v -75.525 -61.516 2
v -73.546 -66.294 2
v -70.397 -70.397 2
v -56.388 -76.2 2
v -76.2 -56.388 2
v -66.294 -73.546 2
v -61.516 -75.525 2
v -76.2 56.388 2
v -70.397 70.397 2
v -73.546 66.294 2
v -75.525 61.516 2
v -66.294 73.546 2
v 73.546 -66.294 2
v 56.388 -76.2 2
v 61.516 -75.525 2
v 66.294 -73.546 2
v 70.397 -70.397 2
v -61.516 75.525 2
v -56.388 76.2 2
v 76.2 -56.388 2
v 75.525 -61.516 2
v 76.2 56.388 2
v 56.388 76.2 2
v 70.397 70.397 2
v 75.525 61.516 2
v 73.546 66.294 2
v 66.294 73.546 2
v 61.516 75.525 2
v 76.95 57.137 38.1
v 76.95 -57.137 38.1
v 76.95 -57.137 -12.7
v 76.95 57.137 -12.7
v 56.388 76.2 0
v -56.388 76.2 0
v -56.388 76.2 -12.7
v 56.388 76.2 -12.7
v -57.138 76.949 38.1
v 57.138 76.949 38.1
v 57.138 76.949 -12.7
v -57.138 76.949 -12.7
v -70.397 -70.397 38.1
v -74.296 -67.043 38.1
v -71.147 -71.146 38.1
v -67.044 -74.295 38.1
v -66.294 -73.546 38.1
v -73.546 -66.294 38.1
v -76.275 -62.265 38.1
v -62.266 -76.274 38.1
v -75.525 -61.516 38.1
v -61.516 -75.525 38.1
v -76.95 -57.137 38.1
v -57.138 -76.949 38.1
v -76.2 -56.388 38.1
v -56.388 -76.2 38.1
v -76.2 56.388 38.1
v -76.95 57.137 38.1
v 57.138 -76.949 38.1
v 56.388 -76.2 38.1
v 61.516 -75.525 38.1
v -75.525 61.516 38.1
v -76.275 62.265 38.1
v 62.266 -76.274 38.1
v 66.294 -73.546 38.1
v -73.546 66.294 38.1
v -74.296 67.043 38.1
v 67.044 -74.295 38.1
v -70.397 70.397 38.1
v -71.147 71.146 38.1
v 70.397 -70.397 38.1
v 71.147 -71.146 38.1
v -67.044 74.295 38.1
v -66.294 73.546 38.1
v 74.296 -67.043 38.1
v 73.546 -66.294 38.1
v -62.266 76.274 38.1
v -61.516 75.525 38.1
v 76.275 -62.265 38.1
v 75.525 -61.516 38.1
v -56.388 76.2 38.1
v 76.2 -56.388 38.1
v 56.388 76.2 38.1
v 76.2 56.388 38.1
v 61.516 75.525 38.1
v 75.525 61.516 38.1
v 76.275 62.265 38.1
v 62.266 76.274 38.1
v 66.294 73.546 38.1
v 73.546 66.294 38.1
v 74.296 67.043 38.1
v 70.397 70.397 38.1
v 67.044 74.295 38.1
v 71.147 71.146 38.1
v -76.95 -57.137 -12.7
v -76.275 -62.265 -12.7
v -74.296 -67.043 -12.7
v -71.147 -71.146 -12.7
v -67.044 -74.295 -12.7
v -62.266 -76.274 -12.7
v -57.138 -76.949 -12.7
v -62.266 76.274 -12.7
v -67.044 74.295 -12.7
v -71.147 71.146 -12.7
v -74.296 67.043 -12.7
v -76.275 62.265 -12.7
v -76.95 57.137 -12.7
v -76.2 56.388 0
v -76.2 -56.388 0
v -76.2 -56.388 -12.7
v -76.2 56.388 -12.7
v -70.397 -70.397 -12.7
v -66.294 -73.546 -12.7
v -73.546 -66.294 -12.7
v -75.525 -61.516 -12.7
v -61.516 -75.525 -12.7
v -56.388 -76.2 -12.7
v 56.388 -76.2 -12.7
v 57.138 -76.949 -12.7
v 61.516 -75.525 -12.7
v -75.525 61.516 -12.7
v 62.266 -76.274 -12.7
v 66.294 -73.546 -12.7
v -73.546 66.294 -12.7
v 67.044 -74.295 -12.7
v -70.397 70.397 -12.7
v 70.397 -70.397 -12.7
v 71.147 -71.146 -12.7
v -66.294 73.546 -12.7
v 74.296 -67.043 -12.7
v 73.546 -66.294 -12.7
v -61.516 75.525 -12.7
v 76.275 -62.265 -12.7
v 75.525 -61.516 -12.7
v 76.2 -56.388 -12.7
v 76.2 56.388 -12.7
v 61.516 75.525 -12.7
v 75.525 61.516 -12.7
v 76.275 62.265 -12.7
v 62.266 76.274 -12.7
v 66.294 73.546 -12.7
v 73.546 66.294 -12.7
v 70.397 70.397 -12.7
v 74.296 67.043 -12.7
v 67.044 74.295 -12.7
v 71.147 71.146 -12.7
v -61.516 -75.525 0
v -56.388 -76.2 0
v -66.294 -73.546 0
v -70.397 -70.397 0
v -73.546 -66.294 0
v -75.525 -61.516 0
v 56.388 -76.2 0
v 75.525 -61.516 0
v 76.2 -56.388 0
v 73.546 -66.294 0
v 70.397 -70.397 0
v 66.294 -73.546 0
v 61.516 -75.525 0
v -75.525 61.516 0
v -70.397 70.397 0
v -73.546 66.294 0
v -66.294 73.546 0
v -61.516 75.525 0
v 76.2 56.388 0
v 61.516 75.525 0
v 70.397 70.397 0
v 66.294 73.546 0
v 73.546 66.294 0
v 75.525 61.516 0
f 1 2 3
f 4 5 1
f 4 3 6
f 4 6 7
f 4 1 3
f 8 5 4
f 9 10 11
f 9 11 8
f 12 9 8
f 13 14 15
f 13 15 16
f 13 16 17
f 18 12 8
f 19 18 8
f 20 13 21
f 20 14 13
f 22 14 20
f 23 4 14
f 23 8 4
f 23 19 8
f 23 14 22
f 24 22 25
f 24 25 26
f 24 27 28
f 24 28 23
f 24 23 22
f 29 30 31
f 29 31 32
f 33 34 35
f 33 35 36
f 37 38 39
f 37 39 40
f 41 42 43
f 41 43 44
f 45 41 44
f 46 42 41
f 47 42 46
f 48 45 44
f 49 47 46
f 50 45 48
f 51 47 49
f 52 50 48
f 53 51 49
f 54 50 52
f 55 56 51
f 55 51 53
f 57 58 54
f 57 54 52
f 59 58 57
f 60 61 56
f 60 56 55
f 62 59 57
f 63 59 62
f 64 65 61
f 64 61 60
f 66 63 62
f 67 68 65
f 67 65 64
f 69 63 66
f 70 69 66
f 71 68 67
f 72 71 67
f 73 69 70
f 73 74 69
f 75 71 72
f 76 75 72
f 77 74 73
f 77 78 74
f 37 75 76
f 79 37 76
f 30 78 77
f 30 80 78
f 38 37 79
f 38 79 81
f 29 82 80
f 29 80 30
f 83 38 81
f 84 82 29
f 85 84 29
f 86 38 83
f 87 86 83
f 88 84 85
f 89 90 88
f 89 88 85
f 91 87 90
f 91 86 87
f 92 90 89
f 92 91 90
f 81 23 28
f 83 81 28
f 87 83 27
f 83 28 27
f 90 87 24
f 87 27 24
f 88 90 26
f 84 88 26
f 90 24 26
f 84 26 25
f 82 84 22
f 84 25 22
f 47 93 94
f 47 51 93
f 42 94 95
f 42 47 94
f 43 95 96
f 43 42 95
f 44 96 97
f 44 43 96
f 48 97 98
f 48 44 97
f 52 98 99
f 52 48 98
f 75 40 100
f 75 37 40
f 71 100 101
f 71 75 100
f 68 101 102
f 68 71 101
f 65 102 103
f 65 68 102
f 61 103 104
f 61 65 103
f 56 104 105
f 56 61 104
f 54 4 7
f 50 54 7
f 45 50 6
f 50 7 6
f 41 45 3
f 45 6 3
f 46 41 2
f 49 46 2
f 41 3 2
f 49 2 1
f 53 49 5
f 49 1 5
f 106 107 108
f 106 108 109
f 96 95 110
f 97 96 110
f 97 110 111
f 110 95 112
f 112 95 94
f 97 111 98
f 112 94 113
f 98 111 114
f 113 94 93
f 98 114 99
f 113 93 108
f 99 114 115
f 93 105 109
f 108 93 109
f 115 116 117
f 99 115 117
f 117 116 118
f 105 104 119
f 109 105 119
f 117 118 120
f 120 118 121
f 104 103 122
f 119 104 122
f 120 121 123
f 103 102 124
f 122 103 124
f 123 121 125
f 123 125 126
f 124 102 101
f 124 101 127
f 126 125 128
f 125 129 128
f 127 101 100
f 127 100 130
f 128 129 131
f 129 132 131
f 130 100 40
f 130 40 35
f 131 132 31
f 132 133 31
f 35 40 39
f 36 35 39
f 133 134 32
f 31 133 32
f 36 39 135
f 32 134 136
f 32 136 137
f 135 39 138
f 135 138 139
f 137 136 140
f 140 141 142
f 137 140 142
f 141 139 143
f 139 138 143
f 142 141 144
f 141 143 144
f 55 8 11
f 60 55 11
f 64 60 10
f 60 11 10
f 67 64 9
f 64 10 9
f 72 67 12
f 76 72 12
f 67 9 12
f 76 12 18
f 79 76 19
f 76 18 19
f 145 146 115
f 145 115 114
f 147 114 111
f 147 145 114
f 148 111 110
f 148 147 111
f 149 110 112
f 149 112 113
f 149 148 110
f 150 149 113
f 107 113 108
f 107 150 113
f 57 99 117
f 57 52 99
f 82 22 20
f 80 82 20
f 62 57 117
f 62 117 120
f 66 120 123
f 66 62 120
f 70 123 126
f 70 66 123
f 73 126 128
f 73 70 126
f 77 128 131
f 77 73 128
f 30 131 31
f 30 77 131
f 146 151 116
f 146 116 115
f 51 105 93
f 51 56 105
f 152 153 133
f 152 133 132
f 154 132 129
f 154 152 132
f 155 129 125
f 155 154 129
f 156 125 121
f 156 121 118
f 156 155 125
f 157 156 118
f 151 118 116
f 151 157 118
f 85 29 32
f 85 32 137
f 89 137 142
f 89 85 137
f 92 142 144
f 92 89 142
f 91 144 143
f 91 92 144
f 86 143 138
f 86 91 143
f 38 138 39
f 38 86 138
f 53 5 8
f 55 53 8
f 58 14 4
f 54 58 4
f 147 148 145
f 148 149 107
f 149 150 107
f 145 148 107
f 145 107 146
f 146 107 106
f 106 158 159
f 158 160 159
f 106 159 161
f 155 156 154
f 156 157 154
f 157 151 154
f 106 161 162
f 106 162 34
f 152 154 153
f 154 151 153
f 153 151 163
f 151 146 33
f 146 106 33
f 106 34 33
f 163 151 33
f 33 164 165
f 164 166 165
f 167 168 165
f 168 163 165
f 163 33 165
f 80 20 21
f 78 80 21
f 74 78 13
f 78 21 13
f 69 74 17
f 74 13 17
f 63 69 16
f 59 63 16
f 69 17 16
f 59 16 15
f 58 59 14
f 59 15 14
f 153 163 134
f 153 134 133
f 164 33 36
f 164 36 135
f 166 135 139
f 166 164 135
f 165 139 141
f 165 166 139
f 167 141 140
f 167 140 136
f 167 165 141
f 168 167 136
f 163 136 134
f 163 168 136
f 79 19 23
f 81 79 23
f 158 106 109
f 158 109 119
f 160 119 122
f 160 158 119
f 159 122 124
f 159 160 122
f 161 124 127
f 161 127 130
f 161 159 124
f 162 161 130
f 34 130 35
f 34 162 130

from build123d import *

# Parameters (mm, degrees)
F1_DEPTH = 38.1
F2_DEPTH = 2
F3_DEPTH = 12.7


with BuildPart() as f1:
    # F0 (on Top) → F1 (new body)
    with BuildSketch(Plane.XY):
        with BuildLine():
            Line((-57.138, -76.9493), (-18.130362, -76.9493))
            Line((-18.130362, -76.9493), (57.138, -76.9493))
            ThreePointArc((57.138, -76.9493), (71.1472, -71.1465), (76.95, -57.1373))
            Line((76.95, -57.1373), (76.95, 57.1373))
            ThreePointArc((76.95, 57.1373), (71.1472, 71.1465), (57.138, 76.9493))
            Line((57.138, 76.9493), (-57.138, 76.9493))
            ThreePointArc((-57.138, 76.9493), (-71.1472, 71.1465), (-76.95, 57.1373))
            Line((-76.95, 57.1373), (-76.95, -57.1373))
            ThreePointArc((-76.95, -57.1373), (-71.1472, -71.1465), (-57.138, -76.9493))
        make_face()
        with BuildLine():
            Line((-56.388, 76.2), (56.388, 76.2))
            ThreePointArc((56.388, 76.2), (70.3972, 70.3972), (76.2, 56.388))
            Line((76.2, 56.388), (76.2, -56.388))
            ThreePointArc((76.2, -56.388), (70.3972, -70.3972), (56.388, -76.2))
            Line((56.388, -76.2), (-18.130362, -76.2))
            Line((-18.130362, -76.2), (-56.388, -76.2))
            ThreePointArc((-56.388, -76.2), (-70.3972, -70.3972), (-76.2, -56.388))
            Line((-76.2, -56.388), (-76.2, 56.388))
            ThreePointArc((-76.2, 56.388), (-70.3972, 70.3972), (-56.388, 76.2))
        make_face(mode=Mode.SUBTRACT)
    extrude(amount=F1_DEPTH)

    # F0 (on Top) → F2 (join)
    with BuildSketch(Plane.XY):
        with BuildLine():
            ThreePointArc((76.2, 56.388), (70.3972, 70.3972), (56.388, 76.2))
            Line((56.388, 76.2), (-56.388, 76.2))
            ThreePointArc((-56.388, 76.2), (-70.3972, 70.3972), (-76.2, 56.388))
            Line((-76.2, 56.388), (-76.2, -56.388))
            ThreePointArc((-76.2, -56.388), (-70.3972, -70.3972), (-56.388, -76.2))
            Line((-56.388, -76.2), (-18.130362, -76.2))
            Line((-18.130362, -76.2), (56.388, -76.2))
            ThreePointArc((56.388, -76.2), (70.3972, -70.3972), (76.2, -56.388))
            Line((76.2, -56.388), (76.2, 56.388))
        make_face()
    extrude(amount=F2_DEPTH)

    # F0 (on Top) → F3 (join)
    with BuildSketch(Plane.XY):
        with BuildLine():
            Line((-57.138, -76.9493), (-18.130362, -76.9493))
            Line((-18.130362, -76.9493), (57.138, -76.9493))
            ThreePointArc((57.138, -76.9493), (71.1472, -71.1465), (76.95, -57.1373))
            Line((76.95, -57.1373), (76.95, 57.1373))
            ThreePointArc((76.95, 57.1373), (71.1472, 71.1465), (57.138, 76.9493))
            Line((57.138, 76.9493), (-57.138, 76.9493))
            ThreePointArc((-57.138, 76.9493), (-71.1472, 71.1465), (-76.95, 57.1373))
            Line((-76.95, 57.1373), (-76.95, -57.1373))
            ThreePointArc((-76.95, -57.1373), (-71.1472, -71.1465), (-57.138, -76.9493))
        make_face()
        with BuildLine():
            Line((-56.388, 76.2), (56.388, 76.2))
            ThreePointArc((56.388, 76.2), (70.3972, 70.3972), (76.2, 56.388))
            Line((76.2, 56.388), (76.2, -56.388))
            ThreePointArc((76.2, -56.388), (70.3972, -70.3972), (56.388, -76.2))
            Line((56.388, -76.2), (-18.130362, -76.2))
            Line((-18.130362, -76.2), (-56.388, -76.2))
            ThreePointArc((-56.388, -76.2), (-70.3972, -70.3972), (-76.2, -56.388))
            Line((-76.2, -56.388), (-76.2, 56.388))
            ThreePointArc((-76.2, 56.388), (-70.3972, 70.3972), (-56.388, 76.2))
        make_face(mode=Mode.SUBTRACT)
    extrude(amount=-F3_DEPTH)


solid = f1.part
